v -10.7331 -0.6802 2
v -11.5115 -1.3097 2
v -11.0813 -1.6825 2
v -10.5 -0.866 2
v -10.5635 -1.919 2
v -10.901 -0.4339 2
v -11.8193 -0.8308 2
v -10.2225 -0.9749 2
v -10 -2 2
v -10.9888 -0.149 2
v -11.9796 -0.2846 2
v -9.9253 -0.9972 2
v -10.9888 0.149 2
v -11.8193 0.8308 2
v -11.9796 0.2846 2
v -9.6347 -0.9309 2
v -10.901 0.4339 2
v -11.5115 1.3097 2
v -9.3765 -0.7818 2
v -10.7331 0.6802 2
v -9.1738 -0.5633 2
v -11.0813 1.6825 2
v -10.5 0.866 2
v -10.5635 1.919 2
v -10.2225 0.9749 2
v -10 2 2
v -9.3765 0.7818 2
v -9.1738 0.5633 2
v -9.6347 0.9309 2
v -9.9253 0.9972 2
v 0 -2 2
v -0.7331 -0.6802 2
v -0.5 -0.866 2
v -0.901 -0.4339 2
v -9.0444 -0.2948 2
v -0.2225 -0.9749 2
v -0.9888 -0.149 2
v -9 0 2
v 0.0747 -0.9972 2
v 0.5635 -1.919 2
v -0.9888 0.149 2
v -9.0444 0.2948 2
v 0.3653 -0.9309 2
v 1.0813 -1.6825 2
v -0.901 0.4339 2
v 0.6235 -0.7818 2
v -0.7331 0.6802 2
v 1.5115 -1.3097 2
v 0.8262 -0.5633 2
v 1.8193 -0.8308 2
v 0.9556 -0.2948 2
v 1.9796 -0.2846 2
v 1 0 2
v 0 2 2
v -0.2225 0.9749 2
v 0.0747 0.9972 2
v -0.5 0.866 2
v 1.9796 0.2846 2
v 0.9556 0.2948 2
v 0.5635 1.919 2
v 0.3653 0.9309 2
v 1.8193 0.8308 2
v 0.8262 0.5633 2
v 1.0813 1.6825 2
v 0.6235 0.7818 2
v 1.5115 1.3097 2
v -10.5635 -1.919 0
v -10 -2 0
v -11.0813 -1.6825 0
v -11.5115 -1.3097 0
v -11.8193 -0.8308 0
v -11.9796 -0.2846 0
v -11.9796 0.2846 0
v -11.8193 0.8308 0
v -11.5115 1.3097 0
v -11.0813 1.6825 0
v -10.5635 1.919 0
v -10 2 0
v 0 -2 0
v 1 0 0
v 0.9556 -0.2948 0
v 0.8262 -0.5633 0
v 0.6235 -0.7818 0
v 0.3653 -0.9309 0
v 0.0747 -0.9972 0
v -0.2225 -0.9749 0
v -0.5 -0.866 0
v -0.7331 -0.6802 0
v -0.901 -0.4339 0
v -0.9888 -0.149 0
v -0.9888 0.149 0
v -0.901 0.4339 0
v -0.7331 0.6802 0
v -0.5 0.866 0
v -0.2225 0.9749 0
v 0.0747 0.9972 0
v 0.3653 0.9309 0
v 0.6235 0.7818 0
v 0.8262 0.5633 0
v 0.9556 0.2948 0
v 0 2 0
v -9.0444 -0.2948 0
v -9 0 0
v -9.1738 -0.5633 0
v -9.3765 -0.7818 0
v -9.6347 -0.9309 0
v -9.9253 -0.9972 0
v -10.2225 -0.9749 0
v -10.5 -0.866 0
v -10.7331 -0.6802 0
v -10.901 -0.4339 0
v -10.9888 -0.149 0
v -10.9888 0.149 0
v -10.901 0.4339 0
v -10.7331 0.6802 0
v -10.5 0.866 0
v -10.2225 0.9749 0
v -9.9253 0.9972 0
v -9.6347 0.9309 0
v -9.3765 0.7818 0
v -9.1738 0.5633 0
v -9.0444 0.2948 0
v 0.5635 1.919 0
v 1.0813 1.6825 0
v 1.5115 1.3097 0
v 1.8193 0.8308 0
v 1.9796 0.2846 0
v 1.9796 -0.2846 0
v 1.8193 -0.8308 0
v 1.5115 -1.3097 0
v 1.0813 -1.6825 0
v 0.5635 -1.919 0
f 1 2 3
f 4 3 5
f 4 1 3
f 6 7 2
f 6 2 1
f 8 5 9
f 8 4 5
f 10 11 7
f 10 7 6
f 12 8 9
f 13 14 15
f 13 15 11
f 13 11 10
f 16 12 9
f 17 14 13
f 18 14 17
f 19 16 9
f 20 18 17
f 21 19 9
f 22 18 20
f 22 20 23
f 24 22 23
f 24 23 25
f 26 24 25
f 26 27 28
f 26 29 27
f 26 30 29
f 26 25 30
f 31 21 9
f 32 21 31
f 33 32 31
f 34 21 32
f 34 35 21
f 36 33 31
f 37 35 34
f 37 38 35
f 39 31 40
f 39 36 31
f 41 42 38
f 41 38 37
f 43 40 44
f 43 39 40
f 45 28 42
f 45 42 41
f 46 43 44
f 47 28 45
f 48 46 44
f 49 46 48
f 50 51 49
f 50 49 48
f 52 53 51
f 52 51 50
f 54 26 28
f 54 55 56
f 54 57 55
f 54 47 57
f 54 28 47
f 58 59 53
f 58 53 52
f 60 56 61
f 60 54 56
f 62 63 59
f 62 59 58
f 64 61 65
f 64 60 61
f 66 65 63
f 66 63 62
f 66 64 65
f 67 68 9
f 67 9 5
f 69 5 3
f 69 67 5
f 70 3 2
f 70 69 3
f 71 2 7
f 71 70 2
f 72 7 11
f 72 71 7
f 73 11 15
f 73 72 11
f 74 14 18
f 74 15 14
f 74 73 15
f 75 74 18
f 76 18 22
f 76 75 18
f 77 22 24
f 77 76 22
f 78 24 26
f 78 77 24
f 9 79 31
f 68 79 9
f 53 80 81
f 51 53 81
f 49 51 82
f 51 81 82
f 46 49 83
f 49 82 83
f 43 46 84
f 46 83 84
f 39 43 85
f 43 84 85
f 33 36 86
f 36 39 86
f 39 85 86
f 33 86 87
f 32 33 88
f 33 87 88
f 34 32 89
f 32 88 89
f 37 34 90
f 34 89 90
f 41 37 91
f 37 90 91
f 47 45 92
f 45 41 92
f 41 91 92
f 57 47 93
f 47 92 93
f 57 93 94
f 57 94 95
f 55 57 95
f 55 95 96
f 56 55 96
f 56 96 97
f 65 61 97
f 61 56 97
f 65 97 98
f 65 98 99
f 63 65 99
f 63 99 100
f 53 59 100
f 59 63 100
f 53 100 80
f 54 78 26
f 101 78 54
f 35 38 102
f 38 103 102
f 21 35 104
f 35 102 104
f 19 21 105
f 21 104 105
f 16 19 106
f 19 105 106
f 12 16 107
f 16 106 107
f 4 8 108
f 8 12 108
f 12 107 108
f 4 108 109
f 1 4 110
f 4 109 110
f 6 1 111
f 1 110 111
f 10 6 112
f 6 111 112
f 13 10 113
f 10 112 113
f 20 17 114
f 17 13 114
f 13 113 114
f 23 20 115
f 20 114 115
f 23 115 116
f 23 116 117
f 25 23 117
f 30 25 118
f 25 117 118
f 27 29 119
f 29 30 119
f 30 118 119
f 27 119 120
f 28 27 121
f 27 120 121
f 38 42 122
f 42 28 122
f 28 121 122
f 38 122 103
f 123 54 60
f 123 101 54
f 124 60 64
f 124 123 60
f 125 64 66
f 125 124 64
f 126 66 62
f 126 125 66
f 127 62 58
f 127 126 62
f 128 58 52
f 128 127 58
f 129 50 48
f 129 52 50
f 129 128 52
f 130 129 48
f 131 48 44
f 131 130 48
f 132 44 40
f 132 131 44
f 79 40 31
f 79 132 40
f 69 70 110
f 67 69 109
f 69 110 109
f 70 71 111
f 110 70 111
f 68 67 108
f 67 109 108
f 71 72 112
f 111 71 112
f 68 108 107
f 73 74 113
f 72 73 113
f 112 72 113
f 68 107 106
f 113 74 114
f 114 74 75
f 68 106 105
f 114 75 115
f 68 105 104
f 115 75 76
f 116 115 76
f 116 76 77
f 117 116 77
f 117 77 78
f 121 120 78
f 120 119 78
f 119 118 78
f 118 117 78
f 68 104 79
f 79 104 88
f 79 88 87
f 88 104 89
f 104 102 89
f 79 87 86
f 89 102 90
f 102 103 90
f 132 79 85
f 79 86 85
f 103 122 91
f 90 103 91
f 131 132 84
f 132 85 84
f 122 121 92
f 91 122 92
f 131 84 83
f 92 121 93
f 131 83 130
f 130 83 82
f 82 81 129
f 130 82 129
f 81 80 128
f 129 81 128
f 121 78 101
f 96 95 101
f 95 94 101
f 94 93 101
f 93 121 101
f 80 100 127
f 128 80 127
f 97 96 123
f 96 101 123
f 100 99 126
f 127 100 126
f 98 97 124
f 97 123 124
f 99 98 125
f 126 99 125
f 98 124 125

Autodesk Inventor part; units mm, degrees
ref_plane "YZ Plane" through (0, 0, 0) normal (1, 0, 0) x (0, 1, 0)
ref_plane "XZ Plane" through (0, 0, 0) normal (0, 1, 0) x (-1, 0, 0)
ref_plane "XY Plane" through (0, 0, 0) normal (0, 0, 1) x (1, 0, 0)
sketch "Sketch1" plane through (0, 0, 0) normal (0, 0, 1) x (1, 0, 0)
  circle A0 centre (0, 0) radius 1
  circle A1 centre (-10, 0) radius 1
  line L0 (-10, 2) -> (0, 2)
  arc A2 (0, -2) -> (0, 2) centre (0, 0) ccw
  line L1 (0, -2) -> (-10, -2)
  arc A3 (-10, 2) -> (-10, -2) centre (-10, 0) ccw
  dimension "d0" = 2
  dimension "d1" = 10
  dimension "d2" = 2
extrude "Extrusion1" add sketch "Sketch1" along normal blind 2
properties part number "panto_linkageA"
